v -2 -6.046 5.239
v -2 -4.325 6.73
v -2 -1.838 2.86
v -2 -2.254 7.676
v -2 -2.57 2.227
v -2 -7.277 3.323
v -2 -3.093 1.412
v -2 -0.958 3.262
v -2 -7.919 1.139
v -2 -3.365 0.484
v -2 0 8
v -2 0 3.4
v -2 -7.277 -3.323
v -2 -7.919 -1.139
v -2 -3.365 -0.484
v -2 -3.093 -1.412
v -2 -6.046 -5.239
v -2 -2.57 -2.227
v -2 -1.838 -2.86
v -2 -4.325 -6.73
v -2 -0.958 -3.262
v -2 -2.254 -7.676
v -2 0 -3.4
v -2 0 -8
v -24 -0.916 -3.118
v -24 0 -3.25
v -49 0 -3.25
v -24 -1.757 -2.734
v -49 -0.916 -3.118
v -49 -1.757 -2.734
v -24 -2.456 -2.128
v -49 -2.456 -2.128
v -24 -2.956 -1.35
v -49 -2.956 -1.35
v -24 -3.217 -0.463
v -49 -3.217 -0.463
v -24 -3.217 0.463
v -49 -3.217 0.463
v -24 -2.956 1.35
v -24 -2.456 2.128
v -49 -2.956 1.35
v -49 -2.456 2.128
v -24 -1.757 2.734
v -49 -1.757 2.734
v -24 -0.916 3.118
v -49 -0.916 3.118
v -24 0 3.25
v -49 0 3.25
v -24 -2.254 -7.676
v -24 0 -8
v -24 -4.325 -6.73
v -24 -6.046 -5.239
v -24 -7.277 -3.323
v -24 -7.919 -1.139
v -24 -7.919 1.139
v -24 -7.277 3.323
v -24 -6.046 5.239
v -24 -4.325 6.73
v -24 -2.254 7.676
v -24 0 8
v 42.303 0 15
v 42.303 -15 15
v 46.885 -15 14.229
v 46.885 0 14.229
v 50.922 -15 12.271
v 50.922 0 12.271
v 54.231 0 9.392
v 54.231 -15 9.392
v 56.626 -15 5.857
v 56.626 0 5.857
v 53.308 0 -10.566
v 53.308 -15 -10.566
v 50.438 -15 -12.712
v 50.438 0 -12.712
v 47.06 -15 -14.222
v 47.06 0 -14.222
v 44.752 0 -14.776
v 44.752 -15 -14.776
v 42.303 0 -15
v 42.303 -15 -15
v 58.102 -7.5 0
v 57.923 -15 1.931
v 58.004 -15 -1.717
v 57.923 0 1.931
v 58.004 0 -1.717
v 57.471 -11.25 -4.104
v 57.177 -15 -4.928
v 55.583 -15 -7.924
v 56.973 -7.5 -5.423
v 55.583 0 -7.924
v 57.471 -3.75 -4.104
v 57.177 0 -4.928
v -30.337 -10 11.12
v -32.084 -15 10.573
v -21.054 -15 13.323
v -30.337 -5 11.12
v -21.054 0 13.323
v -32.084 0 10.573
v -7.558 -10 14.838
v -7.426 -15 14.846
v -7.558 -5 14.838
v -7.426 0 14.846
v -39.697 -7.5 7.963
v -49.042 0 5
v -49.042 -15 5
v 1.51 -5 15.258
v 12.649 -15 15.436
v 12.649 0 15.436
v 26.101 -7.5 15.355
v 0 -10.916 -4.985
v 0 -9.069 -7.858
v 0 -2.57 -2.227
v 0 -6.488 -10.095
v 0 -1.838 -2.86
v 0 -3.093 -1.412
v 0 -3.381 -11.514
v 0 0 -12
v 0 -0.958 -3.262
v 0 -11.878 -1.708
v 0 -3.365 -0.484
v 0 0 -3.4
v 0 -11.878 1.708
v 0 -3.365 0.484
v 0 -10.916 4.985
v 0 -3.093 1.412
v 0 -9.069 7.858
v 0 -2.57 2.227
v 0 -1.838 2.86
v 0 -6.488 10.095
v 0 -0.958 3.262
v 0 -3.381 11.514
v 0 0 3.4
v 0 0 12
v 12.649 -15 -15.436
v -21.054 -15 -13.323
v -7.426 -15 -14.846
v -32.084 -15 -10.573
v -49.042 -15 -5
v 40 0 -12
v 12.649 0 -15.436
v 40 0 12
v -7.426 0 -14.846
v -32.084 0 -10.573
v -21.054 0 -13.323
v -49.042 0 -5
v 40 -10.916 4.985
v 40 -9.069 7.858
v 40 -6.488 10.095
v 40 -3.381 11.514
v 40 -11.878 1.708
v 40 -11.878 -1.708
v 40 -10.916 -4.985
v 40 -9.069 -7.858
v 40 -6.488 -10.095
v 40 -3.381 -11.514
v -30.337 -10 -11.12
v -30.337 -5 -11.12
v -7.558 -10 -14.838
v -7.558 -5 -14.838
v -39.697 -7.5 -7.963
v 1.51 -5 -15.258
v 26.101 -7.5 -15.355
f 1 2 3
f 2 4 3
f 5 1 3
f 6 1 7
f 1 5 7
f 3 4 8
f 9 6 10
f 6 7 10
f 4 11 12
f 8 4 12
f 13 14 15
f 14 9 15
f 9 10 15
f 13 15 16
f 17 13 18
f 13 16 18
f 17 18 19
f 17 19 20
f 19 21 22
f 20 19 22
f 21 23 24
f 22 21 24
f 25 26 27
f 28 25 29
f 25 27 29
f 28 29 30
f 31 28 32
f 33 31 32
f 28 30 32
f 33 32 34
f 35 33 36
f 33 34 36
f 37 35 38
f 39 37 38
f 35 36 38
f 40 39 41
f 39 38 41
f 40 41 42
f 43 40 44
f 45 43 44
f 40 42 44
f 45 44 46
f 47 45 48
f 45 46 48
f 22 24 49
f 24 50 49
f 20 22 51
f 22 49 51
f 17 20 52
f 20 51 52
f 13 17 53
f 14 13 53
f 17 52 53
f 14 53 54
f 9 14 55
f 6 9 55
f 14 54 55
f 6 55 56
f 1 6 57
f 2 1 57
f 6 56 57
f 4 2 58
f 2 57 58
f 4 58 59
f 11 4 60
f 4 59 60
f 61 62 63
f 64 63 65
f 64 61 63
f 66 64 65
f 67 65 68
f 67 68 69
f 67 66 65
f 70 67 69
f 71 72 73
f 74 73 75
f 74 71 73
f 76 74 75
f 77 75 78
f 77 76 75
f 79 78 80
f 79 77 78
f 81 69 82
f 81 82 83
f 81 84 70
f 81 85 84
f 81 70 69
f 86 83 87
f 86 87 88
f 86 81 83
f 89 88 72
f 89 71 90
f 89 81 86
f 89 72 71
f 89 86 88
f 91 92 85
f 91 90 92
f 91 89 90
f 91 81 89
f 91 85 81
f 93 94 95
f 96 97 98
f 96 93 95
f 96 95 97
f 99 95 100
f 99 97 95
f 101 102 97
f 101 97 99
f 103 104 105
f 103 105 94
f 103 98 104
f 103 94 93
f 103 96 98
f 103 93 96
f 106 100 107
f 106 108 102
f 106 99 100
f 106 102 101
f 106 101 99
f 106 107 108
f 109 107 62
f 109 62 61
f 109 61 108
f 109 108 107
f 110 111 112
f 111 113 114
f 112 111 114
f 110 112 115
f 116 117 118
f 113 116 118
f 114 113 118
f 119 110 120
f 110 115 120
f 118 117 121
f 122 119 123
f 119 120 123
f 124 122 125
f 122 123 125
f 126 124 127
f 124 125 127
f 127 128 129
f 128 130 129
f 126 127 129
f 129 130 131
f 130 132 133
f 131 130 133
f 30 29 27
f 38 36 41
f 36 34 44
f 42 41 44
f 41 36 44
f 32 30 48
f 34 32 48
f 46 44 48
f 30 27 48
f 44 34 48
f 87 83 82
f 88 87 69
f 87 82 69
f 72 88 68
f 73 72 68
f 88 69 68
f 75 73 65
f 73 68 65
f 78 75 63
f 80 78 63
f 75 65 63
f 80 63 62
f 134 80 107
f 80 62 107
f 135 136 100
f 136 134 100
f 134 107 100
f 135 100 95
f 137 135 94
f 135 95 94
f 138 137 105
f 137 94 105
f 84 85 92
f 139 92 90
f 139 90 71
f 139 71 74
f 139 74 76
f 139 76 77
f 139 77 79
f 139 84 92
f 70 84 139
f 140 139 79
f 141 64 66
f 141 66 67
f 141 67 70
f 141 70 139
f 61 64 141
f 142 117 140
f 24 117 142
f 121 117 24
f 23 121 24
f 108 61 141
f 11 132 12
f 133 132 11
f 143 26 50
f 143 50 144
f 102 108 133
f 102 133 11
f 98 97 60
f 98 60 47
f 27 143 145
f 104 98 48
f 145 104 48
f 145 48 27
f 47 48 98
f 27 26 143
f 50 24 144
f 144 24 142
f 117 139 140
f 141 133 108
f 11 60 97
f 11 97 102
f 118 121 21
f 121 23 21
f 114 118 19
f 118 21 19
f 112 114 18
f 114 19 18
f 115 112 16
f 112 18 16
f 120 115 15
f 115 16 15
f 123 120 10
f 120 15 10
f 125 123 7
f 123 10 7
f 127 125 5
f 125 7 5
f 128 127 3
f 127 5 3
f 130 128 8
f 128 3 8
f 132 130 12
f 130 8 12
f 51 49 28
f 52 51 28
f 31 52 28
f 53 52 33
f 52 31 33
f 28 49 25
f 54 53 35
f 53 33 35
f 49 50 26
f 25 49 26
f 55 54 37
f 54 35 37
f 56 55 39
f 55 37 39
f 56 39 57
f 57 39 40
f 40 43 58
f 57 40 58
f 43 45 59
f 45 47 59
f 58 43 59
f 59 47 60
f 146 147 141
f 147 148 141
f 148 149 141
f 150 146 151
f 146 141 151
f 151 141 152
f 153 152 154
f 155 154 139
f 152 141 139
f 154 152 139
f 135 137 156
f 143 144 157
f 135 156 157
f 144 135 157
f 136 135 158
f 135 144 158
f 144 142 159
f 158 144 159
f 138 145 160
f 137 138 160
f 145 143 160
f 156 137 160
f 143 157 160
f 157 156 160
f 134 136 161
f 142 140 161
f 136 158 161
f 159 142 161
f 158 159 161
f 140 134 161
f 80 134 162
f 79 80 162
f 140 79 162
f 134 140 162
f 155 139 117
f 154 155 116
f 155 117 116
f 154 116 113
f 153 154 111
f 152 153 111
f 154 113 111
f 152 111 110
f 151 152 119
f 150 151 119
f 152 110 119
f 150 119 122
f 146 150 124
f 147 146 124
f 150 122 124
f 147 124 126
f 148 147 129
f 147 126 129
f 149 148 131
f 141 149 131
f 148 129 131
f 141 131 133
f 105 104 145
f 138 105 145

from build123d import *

# Parameters (mm, degrees)
F3_DEPTH = 15


with BuildPart() as f1:
    # F0 (on Front) → F1 (revolve)
    with BuildSketch(Plane.XZ):
        Polygon((-24, 3.25), (-49, 3.25), (-49, 0), (40, 0), (40, 12), (0, 12), (0, 3.4), (-2, 3.4), (-2, 8), (-24, 8), align=None)
    revolve(axis=Axis((-4.5, 0, 0), (-1, 0, 0)))


with BuildPart() as f3:
    # F2 (on Front) → F3 (new body)
    with BuildSketch(Plane.XZ):
        with BuildLine():
            add(Edge.make_bspline(
                [(-49.041996, 5), (-24.702918, 11.935834), (-28.770125, 17), (42.303421, 15)],
                knots=[0, 0, 0, 0, 91.891159, 91.891159, 91.891159, 91.891159], degree=3))
            Line((-49.041996, 5), (-49.041996, -5))
            add(Edge.make_bspline(
                [(-49.041996, -5), (-24.702918, -11.935834), (-28.770125, -17), (42.303421, -15)],
                knots=[0, 0, 0, 0, 91.891159, 91.891159, 91.891159, 91.891159], degree=3))
            add(Edge.make_bspline(
                [(42.303421, 15), (51.051009, 14.836123), (64.952584, -0.003986), (51.450081, -14.828151), (42.303421, -15)],
                knots=[0, 0, 0, 0, 21.784888, 43.569776, 43.569776, 43.569776, 43.569776], degree=3))
        make_face()
    extrude(amount=F3_DEPTH)

    # F4: cut F1
    add(f1.part, mode=Mode.SUBTRACT)


solid = f3.part
